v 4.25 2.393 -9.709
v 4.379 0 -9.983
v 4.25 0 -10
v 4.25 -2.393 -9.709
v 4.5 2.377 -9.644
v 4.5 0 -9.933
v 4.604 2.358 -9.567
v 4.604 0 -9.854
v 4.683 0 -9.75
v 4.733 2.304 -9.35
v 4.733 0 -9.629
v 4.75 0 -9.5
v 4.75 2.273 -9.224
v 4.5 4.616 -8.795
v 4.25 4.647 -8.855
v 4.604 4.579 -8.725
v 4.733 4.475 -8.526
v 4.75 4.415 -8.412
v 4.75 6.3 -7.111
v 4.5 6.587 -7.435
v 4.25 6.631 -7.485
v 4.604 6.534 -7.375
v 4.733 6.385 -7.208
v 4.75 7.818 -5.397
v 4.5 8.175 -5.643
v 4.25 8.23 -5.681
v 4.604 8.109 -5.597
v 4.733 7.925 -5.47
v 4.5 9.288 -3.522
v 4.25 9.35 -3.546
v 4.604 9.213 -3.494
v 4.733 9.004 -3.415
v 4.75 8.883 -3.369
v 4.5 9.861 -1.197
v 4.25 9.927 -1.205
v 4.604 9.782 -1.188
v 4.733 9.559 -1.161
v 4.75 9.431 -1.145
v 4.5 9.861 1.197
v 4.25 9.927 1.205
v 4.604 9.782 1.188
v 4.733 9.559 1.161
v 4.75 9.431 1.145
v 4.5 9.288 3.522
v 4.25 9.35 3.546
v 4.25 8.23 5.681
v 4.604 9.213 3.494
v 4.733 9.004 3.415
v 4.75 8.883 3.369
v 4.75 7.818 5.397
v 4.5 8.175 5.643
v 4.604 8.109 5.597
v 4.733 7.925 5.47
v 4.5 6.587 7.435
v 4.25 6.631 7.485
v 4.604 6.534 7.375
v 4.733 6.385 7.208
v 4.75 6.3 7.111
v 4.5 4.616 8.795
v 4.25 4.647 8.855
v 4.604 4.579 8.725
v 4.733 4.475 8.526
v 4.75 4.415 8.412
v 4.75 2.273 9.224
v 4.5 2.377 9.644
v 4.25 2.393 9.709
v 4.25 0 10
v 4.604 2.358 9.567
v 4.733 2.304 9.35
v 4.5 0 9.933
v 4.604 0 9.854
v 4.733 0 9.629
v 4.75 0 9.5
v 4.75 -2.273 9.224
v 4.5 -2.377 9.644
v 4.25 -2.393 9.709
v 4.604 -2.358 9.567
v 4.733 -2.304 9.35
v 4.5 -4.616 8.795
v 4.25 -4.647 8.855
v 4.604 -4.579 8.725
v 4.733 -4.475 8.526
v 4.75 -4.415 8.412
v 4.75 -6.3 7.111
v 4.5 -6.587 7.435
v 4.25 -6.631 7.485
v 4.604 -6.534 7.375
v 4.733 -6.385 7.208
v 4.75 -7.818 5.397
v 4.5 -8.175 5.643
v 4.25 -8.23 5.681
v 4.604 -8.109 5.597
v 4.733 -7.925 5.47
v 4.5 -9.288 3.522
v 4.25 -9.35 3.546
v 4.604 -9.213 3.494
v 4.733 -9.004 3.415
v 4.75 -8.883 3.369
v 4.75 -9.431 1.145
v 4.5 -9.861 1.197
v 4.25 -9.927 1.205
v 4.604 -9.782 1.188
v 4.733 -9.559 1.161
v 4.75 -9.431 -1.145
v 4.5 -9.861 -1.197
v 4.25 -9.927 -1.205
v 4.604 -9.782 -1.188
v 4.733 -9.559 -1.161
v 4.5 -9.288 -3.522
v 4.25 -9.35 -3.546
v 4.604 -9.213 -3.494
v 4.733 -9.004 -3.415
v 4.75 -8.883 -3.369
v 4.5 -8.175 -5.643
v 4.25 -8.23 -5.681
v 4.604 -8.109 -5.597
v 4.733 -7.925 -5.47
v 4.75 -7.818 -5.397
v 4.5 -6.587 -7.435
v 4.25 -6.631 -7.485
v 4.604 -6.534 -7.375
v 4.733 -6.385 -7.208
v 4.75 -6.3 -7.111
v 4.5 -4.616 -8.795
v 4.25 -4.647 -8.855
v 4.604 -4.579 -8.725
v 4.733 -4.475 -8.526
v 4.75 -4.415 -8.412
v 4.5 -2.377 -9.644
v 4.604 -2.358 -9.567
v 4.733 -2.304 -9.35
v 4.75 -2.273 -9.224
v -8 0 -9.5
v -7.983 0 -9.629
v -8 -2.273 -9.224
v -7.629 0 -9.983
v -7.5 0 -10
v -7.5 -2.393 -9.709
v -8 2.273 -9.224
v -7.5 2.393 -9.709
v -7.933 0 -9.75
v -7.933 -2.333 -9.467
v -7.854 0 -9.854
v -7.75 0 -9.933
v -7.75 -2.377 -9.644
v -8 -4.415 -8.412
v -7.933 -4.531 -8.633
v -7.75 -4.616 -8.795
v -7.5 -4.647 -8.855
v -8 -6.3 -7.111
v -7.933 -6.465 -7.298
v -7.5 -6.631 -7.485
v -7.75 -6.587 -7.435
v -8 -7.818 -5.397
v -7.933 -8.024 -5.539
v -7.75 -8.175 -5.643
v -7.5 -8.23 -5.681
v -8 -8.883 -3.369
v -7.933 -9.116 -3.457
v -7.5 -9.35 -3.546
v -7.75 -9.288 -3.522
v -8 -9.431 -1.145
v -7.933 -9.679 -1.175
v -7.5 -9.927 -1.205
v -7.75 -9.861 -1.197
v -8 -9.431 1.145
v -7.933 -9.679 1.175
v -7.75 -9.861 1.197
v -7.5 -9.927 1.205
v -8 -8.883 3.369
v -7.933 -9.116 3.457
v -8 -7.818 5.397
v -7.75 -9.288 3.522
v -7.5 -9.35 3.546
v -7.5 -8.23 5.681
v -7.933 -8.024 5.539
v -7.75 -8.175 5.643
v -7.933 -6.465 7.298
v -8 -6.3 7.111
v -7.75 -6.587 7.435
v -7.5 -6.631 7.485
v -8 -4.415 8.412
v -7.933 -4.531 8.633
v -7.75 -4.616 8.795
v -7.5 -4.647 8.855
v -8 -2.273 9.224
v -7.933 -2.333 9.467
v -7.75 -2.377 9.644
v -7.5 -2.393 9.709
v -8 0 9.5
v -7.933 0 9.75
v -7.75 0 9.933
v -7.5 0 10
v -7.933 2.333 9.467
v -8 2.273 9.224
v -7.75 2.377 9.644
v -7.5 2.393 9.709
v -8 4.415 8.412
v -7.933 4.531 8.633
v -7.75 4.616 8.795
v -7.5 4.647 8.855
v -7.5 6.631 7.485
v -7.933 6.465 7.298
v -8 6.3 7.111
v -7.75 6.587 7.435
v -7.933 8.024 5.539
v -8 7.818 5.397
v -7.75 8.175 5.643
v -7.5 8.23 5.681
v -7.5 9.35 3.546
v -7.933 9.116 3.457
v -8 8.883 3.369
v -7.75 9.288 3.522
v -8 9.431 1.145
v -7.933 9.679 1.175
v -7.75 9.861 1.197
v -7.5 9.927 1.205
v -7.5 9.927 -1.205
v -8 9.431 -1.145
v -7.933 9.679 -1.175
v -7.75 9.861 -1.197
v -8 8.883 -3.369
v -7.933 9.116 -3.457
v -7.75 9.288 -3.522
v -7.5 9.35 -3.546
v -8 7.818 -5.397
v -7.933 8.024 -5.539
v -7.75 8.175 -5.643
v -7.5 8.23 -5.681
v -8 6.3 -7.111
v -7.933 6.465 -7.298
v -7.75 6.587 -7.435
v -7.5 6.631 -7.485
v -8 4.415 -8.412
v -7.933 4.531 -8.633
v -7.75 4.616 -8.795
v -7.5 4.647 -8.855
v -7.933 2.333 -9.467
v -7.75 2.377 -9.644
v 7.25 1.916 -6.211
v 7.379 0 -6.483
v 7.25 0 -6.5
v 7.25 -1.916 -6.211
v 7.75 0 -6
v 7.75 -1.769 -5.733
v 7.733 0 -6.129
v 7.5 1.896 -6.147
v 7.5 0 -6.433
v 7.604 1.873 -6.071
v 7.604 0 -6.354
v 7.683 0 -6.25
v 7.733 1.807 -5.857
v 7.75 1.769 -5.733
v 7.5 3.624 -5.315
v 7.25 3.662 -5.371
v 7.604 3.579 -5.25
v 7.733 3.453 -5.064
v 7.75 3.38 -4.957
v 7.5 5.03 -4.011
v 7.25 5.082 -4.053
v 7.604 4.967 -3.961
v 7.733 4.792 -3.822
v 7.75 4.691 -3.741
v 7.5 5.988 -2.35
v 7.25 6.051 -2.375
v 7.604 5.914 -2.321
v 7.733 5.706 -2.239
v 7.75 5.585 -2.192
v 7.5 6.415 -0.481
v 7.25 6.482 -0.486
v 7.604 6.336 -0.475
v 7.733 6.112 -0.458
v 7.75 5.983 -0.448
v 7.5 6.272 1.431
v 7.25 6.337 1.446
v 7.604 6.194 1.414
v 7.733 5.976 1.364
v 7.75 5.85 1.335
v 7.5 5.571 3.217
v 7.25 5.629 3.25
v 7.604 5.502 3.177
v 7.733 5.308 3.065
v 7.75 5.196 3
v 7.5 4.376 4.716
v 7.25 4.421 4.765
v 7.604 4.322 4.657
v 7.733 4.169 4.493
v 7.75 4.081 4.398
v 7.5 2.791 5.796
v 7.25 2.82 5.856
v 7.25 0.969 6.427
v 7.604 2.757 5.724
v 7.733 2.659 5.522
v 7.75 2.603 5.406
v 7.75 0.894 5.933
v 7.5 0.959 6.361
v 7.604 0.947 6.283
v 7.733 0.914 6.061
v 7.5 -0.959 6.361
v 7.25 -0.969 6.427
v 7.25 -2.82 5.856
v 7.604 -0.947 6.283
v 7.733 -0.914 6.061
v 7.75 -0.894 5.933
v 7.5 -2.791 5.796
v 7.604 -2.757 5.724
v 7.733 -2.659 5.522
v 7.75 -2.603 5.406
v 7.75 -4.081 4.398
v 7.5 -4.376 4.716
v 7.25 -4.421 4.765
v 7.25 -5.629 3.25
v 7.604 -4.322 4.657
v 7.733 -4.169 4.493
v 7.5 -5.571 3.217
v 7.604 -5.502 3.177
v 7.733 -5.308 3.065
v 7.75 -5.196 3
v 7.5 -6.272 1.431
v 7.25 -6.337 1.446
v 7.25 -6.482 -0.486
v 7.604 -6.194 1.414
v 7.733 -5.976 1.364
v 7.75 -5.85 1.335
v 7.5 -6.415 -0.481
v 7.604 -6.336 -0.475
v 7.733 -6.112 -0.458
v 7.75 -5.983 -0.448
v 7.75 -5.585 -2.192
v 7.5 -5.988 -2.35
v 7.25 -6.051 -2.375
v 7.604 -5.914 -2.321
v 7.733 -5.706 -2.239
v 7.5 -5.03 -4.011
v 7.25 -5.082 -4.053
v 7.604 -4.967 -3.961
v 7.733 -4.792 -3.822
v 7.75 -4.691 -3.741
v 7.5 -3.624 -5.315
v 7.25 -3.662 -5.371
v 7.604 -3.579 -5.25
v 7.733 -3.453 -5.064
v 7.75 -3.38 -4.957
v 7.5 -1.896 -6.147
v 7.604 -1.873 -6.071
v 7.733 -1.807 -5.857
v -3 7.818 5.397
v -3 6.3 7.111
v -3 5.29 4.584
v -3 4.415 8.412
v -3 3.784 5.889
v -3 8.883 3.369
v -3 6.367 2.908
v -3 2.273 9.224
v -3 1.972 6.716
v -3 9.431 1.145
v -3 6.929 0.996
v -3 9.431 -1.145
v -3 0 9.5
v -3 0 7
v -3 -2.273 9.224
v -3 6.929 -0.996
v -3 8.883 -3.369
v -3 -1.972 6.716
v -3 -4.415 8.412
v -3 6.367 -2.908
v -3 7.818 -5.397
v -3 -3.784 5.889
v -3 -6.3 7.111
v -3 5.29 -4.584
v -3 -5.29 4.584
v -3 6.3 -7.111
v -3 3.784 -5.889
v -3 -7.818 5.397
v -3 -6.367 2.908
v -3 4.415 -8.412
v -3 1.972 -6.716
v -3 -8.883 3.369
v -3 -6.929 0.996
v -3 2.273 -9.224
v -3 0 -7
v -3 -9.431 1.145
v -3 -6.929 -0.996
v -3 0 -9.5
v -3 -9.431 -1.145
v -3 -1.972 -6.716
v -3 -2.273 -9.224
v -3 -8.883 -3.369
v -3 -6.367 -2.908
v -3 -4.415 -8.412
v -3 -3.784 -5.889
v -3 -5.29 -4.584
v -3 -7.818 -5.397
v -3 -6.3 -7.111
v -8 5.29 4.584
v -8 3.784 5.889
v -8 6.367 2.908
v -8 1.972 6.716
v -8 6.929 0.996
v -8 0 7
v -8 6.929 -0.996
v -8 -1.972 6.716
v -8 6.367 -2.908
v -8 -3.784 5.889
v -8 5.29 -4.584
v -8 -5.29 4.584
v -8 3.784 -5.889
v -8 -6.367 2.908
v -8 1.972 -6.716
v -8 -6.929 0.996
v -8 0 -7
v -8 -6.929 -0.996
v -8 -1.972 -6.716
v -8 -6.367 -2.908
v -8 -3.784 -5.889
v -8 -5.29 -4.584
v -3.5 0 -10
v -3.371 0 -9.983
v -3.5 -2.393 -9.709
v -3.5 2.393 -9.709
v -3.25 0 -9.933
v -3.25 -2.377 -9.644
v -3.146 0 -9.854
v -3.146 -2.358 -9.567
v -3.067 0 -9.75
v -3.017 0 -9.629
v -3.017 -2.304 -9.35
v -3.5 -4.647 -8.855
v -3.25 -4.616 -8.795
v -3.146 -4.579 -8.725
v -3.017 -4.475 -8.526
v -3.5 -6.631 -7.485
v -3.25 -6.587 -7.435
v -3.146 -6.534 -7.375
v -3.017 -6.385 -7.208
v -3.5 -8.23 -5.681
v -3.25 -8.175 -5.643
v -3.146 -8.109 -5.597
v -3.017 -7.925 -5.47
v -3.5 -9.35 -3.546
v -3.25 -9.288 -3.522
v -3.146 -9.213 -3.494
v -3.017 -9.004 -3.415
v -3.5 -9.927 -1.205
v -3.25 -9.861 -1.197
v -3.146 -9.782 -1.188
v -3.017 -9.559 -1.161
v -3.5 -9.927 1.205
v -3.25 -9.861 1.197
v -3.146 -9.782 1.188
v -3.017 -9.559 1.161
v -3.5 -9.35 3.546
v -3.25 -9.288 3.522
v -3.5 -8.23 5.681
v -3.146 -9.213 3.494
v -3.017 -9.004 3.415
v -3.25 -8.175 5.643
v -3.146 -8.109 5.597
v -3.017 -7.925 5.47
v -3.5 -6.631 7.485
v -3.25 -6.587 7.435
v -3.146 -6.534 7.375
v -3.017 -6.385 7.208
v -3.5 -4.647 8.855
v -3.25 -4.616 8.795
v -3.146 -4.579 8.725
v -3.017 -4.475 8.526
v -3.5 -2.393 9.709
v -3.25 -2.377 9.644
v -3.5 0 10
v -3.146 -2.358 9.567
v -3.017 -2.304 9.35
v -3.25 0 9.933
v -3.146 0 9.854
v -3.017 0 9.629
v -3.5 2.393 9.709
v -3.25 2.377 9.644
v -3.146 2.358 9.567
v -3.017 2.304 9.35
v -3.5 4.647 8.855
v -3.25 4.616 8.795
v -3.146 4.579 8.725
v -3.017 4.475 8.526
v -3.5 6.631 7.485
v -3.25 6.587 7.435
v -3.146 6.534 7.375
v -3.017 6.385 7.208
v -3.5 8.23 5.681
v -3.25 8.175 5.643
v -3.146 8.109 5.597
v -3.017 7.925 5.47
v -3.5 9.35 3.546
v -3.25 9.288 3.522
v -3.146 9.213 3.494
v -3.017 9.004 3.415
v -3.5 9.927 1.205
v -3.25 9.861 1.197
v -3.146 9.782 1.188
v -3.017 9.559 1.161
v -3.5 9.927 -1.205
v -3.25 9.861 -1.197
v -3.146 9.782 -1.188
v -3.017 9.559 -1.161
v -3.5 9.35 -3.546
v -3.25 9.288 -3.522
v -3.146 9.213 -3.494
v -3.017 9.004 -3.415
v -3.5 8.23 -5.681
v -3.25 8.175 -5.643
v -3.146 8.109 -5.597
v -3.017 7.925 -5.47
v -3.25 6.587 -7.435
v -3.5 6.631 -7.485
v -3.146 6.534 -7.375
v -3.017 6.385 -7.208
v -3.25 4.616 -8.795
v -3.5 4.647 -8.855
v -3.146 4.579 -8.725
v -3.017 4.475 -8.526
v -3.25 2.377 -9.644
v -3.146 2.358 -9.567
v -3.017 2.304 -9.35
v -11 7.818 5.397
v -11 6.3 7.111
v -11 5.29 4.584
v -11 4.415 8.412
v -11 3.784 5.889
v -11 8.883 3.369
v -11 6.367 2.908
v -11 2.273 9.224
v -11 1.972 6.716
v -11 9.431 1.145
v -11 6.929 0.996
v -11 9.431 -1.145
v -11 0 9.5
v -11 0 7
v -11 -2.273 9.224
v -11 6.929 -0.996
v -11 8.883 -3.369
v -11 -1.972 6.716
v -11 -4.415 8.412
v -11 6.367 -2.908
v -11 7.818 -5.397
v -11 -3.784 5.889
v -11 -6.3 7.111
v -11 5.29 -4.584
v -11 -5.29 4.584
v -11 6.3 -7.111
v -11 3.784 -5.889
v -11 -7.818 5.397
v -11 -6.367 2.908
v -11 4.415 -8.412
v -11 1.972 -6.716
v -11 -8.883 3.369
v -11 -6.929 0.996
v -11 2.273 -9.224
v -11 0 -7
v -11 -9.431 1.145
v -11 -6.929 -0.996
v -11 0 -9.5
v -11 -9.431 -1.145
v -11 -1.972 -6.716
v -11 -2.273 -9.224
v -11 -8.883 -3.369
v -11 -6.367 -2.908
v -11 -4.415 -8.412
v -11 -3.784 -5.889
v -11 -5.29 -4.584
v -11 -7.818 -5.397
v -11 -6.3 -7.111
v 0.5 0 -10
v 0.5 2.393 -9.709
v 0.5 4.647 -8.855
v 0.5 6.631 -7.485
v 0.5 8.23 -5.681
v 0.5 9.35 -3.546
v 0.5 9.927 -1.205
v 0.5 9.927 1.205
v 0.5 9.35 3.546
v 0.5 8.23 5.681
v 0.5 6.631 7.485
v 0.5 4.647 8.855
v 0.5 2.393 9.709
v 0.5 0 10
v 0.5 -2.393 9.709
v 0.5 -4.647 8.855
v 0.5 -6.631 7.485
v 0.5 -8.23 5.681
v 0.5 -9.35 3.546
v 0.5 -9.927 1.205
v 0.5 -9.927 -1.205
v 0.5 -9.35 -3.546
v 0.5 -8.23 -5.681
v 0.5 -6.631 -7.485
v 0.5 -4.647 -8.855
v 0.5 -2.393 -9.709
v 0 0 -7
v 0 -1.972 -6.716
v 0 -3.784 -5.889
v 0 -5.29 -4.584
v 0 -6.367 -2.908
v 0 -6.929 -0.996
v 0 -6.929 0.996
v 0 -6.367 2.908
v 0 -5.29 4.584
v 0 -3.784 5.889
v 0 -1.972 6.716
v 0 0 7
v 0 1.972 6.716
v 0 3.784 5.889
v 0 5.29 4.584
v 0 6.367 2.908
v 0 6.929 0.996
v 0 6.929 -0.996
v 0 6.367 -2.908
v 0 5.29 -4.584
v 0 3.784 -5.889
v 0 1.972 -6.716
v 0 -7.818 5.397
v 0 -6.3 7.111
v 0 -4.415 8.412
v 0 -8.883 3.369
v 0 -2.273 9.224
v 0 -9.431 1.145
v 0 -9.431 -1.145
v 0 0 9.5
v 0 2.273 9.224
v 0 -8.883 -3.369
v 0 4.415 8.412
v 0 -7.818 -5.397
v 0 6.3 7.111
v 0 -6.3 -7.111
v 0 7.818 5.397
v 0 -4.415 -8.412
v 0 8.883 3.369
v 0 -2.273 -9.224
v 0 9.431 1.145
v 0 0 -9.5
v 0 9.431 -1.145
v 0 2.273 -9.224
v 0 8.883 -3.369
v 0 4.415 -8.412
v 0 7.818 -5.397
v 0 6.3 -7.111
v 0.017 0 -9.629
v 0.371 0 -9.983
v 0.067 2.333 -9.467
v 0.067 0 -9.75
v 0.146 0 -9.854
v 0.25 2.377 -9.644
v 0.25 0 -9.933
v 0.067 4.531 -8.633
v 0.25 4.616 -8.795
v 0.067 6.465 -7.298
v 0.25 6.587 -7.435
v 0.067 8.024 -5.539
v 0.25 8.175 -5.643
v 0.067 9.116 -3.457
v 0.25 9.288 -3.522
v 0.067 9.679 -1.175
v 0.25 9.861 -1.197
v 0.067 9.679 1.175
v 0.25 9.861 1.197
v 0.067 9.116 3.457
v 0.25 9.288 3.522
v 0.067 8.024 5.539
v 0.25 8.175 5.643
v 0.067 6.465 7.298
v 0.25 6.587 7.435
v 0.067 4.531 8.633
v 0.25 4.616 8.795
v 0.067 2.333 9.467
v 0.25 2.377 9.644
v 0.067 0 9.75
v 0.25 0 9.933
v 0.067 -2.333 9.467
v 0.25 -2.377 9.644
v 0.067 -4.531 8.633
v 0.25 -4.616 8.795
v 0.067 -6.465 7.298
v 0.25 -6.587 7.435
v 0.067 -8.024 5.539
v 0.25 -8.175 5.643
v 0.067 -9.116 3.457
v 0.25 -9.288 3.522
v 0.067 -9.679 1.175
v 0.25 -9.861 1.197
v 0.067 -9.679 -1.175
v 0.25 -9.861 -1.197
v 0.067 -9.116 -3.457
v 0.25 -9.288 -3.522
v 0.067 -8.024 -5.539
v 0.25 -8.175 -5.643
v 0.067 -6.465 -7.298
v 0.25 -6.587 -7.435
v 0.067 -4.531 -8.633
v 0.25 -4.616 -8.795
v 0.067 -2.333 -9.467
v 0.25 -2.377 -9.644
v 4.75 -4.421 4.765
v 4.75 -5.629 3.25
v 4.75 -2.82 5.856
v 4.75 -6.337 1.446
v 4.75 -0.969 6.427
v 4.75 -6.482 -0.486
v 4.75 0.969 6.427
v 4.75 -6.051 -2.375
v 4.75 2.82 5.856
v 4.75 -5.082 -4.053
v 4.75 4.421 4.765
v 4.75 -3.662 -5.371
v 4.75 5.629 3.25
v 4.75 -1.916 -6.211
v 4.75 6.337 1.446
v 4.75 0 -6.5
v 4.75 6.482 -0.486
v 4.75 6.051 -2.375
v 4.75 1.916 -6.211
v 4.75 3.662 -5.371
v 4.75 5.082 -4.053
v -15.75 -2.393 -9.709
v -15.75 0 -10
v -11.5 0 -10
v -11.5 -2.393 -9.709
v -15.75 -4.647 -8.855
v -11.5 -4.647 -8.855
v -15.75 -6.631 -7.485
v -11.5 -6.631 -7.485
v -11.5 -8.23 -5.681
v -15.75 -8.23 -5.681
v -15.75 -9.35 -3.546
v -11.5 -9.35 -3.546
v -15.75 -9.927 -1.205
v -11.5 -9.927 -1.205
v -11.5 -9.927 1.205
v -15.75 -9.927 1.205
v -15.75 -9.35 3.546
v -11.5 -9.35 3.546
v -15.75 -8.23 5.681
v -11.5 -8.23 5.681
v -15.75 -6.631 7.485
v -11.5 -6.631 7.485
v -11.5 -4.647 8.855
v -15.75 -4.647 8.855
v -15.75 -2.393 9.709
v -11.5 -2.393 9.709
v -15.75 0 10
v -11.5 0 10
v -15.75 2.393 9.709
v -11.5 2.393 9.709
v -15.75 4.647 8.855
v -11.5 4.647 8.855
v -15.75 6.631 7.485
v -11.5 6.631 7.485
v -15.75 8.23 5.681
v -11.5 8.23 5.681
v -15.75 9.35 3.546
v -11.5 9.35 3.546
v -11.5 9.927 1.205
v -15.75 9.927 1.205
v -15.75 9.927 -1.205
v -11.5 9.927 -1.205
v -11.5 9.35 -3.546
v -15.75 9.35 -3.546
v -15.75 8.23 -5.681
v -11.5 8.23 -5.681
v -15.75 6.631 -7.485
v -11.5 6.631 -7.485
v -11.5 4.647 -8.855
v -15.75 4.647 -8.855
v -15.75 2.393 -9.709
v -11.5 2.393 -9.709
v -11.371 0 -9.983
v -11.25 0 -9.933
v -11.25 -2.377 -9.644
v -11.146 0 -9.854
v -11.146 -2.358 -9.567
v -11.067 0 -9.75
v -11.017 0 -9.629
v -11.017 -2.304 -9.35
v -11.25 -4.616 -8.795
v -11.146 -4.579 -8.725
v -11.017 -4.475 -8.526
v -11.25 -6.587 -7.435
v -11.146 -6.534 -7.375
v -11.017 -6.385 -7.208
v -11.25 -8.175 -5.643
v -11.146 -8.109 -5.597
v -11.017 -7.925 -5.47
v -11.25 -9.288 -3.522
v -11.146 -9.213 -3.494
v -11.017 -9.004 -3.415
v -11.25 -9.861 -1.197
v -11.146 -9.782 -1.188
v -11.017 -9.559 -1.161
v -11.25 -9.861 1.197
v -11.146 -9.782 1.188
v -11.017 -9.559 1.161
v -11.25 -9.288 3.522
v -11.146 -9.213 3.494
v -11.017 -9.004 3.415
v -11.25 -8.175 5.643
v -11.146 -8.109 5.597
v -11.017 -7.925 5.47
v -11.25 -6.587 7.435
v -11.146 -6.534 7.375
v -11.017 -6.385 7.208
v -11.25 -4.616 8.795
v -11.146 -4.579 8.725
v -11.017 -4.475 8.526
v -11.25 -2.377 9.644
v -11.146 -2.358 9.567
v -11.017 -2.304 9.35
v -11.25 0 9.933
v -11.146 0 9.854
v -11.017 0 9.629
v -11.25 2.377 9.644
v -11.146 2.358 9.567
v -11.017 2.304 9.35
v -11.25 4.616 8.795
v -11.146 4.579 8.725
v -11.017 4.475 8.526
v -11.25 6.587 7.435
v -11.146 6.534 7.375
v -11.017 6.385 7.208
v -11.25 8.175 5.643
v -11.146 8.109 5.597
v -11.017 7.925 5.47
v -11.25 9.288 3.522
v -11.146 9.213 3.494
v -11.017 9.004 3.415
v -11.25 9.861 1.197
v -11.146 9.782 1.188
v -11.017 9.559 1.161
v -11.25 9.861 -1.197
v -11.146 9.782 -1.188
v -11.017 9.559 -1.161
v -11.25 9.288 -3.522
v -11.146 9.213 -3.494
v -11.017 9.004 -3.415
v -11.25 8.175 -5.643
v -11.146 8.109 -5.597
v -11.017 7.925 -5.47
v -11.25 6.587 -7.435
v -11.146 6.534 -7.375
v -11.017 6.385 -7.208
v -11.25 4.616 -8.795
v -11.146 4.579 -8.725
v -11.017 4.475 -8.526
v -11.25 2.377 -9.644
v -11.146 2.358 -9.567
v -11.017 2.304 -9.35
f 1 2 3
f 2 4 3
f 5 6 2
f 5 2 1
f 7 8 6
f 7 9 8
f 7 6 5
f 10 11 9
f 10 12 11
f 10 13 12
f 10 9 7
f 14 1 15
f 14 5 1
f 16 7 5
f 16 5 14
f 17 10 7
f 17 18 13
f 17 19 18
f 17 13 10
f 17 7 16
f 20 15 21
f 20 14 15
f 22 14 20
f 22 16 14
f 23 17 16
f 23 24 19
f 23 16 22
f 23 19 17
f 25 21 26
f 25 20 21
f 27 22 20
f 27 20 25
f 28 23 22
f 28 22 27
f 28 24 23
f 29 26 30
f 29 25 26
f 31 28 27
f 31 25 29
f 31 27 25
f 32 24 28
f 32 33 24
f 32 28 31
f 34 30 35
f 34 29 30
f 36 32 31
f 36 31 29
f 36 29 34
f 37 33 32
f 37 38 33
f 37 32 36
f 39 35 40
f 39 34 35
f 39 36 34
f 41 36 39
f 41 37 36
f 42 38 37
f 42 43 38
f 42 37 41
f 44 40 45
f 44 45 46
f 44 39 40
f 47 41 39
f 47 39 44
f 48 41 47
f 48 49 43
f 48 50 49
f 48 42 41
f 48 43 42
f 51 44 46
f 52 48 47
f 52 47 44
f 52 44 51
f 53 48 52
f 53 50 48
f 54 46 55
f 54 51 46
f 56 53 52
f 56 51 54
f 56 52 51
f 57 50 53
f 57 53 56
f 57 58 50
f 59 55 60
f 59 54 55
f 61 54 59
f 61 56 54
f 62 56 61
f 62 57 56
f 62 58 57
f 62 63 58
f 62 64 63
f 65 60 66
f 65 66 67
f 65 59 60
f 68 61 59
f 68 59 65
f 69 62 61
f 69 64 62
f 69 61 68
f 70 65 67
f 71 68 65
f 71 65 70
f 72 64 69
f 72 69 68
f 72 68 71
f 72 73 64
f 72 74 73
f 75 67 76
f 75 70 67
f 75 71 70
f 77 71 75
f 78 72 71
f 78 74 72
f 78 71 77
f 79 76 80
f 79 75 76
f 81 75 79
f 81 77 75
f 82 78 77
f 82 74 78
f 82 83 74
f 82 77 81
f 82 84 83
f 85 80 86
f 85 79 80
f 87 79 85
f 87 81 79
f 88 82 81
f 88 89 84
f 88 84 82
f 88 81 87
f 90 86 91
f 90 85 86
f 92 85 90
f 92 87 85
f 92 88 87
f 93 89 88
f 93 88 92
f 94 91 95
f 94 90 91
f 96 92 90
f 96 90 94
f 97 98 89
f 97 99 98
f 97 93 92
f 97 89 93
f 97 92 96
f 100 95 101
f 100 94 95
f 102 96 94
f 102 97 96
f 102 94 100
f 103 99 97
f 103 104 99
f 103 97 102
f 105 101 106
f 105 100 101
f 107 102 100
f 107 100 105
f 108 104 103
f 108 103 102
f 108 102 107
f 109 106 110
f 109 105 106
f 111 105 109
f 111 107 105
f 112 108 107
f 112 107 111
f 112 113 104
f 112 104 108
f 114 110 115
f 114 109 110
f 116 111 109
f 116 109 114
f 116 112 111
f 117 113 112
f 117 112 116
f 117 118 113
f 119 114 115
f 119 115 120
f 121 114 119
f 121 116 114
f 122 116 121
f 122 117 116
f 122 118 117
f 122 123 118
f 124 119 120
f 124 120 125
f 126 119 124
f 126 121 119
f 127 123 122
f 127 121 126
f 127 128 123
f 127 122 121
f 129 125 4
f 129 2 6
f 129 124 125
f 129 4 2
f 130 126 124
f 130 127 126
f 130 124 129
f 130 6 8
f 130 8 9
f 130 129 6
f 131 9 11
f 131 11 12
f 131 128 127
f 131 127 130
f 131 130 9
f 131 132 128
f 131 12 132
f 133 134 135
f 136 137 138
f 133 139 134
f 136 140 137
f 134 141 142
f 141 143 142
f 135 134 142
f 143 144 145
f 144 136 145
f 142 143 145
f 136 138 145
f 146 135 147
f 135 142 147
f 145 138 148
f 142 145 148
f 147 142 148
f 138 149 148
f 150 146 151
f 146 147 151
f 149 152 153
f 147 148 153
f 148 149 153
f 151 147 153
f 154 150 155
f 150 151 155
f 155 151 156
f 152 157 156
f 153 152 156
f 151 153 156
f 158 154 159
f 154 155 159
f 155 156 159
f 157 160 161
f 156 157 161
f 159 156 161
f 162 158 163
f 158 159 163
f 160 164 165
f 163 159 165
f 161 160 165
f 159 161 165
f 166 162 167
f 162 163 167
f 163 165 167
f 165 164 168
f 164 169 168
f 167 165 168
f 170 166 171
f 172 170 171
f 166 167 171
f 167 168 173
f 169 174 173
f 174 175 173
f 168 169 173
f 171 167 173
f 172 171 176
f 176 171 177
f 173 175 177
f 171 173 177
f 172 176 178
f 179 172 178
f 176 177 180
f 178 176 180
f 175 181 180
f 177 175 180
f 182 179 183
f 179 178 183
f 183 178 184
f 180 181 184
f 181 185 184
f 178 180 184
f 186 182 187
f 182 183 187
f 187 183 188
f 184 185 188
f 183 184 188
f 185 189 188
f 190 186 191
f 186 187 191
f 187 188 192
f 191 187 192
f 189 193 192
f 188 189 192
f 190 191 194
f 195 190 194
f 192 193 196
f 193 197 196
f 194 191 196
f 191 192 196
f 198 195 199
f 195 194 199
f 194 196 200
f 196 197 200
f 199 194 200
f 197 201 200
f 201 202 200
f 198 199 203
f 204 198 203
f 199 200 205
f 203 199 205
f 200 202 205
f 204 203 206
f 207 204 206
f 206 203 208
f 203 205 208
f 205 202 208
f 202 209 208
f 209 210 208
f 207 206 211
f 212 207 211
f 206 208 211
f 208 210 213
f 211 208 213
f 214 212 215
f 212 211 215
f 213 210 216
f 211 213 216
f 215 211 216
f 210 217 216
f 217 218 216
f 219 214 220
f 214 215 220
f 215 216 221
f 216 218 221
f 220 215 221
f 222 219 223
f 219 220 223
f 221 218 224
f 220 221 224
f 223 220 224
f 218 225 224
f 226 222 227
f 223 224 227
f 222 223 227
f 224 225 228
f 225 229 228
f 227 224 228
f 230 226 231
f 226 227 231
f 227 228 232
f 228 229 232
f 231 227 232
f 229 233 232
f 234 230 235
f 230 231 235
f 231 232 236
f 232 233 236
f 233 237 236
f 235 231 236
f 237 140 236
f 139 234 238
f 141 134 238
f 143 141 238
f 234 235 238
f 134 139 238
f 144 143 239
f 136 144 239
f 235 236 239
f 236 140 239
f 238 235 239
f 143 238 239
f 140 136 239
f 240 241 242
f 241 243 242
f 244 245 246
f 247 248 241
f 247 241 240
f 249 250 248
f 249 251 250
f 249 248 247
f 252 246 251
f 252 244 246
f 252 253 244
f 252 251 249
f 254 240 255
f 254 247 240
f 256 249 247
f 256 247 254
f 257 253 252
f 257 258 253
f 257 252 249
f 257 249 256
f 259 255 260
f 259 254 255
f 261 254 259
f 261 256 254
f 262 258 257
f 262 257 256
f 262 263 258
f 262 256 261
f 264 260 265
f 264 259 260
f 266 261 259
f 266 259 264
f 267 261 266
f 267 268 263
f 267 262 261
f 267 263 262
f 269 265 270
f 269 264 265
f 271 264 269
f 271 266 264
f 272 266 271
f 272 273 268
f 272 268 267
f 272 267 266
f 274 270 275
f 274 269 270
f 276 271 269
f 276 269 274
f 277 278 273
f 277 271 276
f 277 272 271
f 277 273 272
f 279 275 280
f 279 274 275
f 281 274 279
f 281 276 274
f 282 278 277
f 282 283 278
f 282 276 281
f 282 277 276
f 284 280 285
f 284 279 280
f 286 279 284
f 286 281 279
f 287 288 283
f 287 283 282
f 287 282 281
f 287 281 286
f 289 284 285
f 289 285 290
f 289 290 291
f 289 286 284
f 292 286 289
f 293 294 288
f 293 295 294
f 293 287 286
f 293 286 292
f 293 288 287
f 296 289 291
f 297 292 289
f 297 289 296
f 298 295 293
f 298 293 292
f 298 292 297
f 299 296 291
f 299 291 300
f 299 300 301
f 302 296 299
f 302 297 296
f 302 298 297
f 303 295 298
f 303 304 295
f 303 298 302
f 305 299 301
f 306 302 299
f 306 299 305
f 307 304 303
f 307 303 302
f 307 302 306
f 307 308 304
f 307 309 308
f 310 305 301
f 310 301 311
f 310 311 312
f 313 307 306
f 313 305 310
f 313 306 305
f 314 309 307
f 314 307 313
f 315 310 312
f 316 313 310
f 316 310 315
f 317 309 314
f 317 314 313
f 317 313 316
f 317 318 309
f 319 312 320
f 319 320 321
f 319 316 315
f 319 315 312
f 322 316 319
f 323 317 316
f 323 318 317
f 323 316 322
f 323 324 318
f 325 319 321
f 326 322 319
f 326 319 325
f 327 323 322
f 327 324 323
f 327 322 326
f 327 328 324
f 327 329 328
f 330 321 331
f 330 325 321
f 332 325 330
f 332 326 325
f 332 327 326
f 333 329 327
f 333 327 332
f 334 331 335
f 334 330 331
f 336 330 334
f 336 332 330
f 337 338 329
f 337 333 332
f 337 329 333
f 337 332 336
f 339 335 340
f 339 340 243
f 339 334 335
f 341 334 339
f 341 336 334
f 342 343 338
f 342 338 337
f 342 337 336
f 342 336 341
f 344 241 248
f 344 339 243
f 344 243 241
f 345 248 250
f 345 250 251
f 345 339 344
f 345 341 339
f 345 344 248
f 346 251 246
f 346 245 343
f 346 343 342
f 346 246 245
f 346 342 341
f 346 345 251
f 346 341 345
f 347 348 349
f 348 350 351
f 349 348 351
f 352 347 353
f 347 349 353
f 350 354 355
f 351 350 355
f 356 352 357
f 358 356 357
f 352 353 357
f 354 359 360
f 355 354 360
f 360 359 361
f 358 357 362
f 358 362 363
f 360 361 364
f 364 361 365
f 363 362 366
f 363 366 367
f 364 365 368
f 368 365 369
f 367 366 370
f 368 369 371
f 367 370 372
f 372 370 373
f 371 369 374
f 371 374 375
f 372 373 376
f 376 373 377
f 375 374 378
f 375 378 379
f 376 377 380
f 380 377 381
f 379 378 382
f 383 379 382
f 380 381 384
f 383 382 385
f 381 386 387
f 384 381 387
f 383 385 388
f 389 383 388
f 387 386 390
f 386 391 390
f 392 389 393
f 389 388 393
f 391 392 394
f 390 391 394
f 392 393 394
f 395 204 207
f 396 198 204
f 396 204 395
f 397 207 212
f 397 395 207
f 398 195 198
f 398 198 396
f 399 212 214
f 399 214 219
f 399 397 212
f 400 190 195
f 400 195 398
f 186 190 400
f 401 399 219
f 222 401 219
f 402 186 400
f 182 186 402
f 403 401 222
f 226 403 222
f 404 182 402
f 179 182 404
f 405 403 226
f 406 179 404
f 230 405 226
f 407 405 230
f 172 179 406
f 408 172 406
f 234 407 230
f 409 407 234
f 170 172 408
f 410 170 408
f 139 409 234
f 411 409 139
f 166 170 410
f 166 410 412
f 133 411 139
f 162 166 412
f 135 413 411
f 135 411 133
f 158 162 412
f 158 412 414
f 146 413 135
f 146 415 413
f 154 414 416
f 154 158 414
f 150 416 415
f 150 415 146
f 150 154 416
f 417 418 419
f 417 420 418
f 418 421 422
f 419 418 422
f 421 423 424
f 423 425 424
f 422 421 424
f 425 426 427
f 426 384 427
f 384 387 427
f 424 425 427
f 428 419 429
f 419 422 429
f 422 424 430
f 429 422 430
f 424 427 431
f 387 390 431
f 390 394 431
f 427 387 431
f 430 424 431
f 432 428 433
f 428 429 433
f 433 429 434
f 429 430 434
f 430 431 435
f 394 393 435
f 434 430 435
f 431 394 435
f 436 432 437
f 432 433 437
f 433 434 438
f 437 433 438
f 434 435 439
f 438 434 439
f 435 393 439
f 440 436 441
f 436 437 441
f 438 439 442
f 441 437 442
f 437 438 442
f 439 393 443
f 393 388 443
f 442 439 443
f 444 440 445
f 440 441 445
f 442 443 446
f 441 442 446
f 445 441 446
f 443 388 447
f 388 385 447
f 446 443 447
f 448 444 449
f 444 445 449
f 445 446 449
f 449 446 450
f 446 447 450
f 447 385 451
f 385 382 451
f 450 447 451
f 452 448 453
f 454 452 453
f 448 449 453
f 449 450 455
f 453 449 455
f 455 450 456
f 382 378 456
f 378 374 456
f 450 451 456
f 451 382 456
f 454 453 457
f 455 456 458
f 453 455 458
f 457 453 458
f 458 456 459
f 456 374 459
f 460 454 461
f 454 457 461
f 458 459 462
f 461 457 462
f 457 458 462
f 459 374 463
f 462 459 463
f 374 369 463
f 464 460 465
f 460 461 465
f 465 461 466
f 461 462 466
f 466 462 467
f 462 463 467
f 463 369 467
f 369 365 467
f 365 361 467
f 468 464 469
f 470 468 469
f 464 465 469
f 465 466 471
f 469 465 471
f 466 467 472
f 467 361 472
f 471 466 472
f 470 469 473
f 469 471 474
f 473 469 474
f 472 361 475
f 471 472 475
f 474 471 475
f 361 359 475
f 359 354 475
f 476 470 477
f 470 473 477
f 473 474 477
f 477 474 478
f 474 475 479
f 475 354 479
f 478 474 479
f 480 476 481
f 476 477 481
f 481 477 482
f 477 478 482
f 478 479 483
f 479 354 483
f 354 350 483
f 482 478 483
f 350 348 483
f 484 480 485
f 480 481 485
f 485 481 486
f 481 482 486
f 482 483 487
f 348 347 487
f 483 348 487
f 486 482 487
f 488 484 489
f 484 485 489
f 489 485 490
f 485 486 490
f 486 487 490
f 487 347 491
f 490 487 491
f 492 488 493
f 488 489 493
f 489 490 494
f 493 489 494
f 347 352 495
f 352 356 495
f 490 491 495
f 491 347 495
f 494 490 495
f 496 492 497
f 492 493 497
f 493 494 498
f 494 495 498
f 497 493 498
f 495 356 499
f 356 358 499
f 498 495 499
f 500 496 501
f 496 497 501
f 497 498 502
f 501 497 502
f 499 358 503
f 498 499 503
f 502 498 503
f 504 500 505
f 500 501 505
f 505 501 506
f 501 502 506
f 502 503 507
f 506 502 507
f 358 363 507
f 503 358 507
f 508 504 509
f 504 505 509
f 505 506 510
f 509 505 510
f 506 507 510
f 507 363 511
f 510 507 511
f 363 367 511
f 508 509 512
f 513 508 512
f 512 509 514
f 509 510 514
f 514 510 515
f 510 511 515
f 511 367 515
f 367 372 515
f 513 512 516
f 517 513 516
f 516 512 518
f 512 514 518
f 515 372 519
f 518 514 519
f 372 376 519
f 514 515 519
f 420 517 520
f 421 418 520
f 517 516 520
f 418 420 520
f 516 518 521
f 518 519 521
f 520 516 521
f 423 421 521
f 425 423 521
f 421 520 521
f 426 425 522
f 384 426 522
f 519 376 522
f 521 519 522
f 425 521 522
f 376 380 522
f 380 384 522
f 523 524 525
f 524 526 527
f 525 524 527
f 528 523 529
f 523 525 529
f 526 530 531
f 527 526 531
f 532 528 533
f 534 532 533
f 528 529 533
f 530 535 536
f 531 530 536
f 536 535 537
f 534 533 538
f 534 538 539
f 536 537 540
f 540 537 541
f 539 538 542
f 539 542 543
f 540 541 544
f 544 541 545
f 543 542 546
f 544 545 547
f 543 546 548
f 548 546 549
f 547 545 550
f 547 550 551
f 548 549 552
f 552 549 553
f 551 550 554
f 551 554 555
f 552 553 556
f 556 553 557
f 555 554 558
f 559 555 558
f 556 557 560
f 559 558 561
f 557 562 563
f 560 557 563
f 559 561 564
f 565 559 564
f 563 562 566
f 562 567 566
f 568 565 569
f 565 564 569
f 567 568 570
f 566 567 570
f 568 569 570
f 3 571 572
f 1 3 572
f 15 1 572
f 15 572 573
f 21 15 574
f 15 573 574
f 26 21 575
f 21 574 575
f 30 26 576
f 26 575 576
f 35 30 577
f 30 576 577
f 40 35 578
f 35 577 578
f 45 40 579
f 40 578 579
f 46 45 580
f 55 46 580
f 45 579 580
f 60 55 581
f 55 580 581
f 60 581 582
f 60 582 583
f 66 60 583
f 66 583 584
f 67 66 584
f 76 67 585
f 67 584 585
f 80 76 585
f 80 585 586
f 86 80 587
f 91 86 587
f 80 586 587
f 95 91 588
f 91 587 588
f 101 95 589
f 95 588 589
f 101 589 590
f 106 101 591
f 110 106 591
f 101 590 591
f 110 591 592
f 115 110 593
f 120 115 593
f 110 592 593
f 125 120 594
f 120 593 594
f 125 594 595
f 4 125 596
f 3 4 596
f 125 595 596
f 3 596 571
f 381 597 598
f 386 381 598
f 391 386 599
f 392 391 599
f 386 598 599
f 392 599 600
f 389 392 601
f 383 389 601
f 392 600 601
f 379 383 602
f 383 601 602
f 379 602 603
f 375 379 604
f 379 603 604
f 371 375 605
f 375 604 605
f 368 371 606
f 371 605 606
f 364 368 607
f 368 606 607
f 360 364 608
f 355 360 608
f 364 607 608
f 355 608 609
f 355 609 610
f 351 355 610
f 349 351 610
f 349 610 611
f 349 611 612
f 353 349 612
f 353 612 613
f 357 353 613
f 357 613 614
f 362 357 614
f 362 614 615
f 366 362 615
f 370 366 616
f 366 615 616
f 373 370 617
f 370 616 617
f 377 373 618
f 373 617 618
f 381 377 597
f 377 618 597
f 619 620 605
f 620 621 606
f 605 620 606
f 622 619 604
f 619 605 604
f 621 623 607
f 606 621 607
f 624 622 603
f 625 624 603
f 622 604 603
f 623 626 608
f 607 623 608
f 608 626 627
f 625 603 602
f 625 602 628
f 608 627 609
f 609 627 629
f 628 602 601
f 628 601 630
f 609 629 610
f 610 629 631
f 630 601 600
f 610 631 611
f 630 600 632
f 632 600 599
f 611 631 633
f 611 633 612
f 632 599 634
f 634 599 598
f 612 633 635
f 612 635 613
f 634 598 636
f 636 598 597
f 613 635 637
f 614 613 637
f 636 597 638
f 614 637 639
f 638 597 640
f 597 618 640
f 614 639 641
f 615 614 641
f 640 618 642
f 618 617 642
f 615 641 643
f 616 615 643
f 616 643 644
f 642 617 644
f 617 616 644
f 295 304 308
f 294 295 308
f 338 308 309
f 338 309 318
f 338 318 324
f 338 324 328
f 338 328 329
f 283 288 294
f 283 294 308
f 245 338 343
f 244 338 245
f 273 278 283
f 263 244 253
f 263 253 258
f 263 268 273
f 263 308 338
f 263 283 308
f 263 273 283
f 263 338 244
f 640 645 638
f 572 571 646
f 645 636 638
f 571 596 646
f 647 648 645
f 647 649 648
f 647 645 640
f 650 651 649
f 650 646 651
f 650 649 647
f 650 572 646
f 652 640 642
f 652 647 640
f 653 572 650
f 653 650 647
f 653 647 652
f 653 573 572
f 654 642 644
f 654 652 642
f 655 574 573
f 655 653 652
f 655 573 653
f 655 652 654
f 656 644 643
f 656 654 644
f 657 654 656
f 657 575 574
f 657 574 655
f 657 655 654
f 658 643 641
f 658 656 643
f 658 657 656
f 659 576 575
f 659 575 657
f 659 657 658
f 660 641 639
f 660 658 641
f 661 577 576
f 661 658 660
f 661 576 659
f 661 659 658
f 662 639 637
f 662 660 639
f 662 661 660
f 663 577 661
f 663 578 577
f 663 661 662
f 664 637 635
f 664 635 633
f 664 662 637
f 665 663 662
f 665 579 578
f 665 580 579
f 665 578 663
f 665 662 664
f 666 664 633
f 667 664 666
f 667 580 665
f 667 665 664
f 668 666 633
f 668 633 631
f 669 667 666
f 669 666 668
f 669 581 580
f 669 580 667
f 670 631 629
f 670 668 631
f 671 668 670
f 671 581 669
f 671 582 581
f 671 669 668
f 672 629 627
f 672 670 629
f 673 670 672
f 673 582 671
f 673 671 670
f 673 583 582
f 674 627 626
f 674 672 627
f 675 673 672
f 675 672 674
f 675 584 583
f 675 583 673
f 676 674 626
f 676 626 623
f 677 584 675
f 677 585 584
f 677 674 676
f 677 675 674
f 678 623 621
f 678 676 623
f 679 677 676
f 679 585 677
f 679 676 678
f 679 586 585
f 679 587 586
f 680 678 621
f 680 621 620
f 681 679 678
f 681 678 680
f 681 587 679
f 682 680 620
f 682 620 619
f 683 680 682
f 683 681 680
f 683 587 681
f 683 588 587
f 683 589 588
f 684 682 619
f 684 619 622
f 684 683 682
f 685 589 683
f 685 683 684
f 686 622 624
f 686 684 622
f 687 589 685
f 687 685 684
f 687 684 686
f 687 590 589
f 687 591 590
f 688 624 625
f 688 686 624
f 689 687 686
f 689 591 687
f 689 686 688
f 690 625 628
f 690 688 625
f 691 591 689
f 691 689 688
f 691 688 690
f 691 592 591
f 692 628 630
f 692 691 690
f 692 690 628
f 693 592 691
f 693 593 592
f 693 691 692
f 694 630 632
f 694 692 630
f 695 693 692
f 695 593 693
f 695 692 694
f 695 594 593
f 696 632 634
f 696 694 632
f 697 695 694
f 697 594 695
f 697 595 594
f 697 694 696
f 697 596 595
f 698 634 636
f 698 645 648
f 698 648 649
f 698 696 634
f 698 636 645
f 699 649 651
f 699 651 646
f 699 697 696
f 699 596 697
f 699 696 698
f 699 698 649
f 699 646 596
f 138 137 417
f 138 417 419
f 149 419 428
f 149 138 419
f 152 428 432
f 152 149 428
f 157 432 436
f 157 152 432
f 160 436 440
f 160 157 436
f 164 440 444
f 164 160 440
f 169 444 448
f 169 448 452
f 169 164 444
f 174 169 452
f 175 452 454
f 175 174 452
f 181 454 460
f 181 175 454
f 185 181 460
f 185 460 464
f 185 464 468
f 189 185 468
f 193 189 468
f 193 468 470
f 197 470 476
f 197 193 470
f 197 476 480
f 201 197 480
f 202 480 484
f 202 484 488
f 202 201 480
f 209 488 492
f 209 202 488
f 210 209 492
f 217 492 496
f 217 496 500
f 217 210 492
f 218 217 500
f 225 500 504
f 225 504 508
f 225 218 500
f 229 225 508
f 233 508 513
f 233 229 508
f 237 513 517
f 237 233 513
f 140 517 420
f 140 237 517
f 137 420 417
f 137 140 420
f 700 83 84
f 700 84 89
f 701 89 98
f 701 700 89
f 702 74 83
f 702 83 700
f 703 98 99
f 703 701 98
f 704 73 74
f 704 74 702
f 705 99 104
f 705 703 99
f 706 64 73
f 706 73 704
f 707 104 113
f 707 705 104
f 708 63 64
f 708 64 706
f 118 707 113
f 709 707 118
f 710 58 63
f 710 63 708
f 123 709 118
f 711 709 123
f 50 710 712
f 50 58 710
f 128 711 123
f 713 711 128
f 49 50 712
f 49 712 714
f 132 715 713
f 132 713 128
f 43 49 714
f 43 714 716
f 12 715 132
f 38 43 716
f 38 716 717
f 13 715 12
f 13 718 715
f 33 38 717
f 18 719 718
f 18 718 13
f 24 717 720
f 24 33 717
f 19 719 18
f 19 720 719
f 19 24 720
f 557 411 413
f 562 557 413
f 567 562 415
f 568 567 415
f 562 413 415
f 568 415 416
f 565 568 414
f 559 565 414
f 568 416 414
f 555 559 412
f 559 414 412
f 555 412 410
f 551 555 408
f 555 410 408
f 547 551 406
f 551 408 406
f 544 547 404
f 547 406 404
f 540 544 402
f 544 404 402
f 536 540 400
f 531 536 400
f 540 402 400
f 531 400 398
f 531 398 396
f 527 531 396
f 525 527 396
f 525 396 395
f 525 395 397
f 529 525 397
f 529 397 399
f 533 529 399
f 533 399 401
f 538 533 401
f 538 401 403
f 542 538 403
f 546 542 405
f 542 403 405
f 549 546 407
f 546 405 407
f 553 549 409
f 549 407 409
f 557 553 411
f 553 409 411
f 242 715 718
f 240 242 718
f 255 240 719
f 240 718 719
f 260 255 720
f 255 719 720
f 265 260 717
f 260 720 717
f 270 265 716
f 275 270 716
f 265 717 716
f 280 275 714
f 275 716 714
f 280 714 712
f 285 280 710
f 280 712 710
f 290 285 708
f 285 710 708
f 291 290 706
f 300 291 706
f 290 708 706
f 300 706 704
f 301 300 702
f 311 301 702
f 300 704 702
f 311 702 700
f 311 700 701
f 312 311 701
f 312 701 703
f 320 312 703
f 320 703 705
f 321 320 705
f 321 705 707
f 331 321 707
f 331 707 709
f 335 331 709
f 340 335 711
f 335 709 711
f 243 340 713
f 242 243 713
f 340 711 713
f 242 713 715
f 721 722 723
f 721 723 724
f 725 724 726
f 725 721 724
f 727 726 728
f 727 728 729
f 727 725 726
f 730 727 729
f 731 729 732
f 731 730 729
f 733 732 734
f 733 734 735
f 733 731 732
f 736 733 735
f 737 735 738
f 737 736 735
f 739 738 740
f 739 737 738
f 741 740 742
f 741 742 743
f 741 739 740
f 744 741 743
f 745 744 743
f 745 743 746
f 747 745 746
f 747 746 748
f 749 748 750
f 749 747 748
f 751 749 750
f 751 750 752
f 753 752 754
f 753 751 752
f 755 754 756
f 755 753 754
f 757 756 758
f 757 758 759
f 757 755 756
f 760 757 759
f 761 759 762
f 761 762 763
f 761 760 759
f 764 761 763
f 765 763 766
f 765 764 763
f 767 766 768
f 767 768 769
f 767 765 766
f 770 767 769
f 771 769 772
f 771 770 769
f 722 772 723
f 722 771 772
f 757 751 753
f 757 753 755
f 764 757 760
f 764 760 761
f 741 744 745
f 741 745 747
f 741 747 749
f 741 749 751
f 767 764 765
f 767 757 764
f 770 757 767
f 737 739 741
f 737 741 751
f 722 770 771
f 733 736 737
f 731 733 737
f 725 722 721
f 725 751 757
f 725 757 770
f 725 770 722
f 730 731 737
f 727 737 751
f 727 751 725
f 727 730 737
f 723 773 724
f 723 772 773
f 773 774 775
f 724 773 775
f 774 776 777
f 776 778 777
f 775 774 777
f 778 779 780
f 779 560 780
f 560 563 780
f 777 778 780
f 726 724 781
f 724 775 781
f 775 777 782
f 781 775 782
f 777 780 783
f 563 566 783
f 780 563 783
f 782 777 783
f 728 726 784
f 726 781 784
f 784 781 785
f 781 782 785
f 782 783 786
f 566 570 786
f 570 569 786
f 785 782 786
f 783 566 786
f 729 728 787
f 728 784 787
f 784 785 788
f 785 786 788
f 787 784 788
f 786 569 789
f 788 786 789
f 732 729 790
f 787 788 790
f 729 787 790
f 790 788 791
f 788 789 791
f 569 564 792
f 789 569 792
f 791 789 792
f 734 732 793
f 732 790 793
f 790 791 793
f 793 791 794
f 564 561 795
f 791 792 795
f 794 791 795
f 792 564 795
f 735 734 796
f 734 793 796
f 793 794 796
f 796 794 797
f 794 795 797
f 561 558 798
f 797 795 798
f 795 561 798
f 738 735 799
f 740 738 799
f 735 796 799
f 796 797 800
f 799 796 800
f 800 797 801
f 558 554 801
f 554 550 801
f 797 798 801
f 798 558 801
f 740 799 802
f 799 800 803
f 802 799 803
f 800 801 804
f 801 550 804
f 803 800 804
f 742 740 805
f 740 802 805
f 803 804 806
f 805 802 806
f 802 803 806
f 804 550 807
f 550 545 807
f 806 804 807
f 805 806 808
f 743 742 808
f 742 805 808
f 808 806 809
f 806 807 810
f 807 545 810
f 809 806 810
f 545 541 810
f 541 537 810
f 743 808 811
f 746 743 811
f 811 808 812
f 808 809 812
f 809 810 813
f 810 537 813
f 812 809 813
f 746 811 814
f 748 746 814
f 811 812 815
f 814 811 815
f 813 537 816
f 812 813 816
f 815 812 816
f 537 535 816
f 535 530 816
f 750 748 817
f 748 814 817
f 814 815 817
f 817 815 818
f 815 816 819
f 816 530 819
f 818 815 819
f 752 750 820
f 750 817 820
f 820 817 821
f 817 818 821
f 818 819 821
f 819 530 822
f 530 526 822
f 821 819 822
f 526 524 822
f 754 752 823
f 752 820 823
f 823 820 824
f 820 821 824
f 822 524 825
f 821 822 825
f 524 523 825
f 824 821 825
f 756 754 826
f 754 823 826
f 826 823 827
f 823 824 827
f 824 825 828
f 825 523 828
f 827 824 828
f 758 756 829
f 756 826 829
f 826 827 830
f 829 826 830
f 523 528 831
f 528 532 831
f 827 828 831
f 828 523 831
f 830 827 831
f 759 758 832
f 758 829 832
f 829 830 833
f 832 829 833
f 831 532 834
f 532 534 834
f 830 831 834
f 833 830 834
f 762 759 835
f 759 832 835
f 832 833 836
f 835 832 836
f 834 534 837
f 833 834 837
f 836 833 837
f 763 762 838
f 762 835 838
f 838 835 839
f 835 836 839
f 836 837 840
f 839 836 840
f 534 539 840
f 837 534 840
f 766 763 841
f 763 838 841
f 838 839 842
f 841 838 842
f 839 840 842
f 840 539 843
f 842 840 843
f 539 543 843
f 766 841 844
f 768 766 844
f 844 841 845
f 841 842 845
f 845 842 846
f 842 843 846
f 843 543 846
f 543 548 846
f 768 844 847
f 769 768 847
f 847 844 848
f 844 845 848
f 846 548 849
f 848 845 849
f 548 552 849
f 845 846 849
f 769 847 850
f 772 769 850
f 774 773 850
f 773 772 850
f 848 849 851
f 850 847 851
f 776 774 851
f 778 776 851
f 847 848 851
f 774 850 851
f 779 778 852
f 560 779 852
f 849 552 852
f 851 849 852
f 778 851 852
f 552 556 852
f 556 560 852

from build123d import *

# Parameters (mm, degrees)
SKETCH1_R           = 10
BOSS_EXTRUDE1_DEPTH = 4.75
SKETCH4_R           = 6.5
BOSS_EXTRUDE2_DEPTH = 3
SKETCH5_R           = 7
BOSS_EXTRUDE3_DEPTH = 3
FILLET1_R           = 0.5
BOSS_EXTRUDE4_START = 5
SKETCH6_R           = 10
BOSS_EXTRUDE4_DEPTH = 5
SKETCH7_R           = 7
BOSS_EXTRUDE5_DEPTH = 3
BOSS_EXTRUDE6_START = 4.75
SKETCH9_R           = 10
BOSS_EXTRUDE6_DEPTH = 4.75
FILLET2_R           = 0.5


with BuildPart() as part:
    # Sketch1 → Boss-Extrude1 (new body)
    with BuildSketch(Plane(origin=(0, 0, 0), x_dir=(0, 0, -1), z_dir=(1, 0, 0))):
        Circle(SKETCH1_R)
    extrude(amount=BOSS_EXTRUDE1_DEPTH)

    # Sketch4 → Boss-Extrude2 (add)
    with BuildSketch(Plane(origin=(4.75, 0, 0), x_dir=(0, 0, -1), z_dir=(1, 0, 0))):
        Circle(SKETCH4_R)
    extrude(amount=BOSS_EXTRUDE2_DEPTH)

    # Sketch5 → Boss-Extrude3 (add)
    with BuildSketch(Plane.ZY):
        with Locations(Location((0, 0, 0), (0, 0, 180))):
            Circle(SKETCH5_R)
    extrude(amount=BOSS_EXTRUDE3_DEPTH)

    # Fillet1
    fillet1_edges = [part.edges().sort_by_distance(p)[0] for p in [
        (7.75, 0, 6.5),
    ]]
    fillet(fillet1_edges, radius=FILLET1_R)

    # Sketch6 → Boss-Extrude4 (add)
    with BuildSketch(Plane.ZY.offset(3).offset(BOSS_EXTRUDE4_START)):
        with Locations(Location((0, 0, 0), (0, 0, 180))):
            Circle(SKETCH6_R)
    extrude(amount=-BOSS_EXTRUDE4_DEPTH)

    # Sketch7 → Boss-Extrude5 (add)
    with BuildSketch(Plane.ZY.offset(8)):
        with Locations(Location((0, 0, 0), (0, 0, 180))):
            Circle(SKETCH7_R)
    extrude(amount=BOSS_EXTRUDE5_DEPTH)

    # Sketch9 → Boss-Extrude6 (add)
    with BuildSketch(Plane.ZY.offset(11).offset(BOSS_EXTRUDE6_START)):
        with Locations(Location((0, 0, 0), (0, 0, 180))):
            Circle(SKETCH9_R)
    extrude(amount=-BOSS_EXTRUDE6_DEPTH)

    # Fillet2
    fillet2_edges = [part.edges().sort_by_distance(p)[0] for p in [
        (-3, 0, 10),
        (-8, 0, 10),
        (0, 0, 10),
        (-11, 0, 10),
        (4.75, 0, 10),
    ]]
    fillet(fillet2_edges, radius=FILLET2_R)


solid = part.part
